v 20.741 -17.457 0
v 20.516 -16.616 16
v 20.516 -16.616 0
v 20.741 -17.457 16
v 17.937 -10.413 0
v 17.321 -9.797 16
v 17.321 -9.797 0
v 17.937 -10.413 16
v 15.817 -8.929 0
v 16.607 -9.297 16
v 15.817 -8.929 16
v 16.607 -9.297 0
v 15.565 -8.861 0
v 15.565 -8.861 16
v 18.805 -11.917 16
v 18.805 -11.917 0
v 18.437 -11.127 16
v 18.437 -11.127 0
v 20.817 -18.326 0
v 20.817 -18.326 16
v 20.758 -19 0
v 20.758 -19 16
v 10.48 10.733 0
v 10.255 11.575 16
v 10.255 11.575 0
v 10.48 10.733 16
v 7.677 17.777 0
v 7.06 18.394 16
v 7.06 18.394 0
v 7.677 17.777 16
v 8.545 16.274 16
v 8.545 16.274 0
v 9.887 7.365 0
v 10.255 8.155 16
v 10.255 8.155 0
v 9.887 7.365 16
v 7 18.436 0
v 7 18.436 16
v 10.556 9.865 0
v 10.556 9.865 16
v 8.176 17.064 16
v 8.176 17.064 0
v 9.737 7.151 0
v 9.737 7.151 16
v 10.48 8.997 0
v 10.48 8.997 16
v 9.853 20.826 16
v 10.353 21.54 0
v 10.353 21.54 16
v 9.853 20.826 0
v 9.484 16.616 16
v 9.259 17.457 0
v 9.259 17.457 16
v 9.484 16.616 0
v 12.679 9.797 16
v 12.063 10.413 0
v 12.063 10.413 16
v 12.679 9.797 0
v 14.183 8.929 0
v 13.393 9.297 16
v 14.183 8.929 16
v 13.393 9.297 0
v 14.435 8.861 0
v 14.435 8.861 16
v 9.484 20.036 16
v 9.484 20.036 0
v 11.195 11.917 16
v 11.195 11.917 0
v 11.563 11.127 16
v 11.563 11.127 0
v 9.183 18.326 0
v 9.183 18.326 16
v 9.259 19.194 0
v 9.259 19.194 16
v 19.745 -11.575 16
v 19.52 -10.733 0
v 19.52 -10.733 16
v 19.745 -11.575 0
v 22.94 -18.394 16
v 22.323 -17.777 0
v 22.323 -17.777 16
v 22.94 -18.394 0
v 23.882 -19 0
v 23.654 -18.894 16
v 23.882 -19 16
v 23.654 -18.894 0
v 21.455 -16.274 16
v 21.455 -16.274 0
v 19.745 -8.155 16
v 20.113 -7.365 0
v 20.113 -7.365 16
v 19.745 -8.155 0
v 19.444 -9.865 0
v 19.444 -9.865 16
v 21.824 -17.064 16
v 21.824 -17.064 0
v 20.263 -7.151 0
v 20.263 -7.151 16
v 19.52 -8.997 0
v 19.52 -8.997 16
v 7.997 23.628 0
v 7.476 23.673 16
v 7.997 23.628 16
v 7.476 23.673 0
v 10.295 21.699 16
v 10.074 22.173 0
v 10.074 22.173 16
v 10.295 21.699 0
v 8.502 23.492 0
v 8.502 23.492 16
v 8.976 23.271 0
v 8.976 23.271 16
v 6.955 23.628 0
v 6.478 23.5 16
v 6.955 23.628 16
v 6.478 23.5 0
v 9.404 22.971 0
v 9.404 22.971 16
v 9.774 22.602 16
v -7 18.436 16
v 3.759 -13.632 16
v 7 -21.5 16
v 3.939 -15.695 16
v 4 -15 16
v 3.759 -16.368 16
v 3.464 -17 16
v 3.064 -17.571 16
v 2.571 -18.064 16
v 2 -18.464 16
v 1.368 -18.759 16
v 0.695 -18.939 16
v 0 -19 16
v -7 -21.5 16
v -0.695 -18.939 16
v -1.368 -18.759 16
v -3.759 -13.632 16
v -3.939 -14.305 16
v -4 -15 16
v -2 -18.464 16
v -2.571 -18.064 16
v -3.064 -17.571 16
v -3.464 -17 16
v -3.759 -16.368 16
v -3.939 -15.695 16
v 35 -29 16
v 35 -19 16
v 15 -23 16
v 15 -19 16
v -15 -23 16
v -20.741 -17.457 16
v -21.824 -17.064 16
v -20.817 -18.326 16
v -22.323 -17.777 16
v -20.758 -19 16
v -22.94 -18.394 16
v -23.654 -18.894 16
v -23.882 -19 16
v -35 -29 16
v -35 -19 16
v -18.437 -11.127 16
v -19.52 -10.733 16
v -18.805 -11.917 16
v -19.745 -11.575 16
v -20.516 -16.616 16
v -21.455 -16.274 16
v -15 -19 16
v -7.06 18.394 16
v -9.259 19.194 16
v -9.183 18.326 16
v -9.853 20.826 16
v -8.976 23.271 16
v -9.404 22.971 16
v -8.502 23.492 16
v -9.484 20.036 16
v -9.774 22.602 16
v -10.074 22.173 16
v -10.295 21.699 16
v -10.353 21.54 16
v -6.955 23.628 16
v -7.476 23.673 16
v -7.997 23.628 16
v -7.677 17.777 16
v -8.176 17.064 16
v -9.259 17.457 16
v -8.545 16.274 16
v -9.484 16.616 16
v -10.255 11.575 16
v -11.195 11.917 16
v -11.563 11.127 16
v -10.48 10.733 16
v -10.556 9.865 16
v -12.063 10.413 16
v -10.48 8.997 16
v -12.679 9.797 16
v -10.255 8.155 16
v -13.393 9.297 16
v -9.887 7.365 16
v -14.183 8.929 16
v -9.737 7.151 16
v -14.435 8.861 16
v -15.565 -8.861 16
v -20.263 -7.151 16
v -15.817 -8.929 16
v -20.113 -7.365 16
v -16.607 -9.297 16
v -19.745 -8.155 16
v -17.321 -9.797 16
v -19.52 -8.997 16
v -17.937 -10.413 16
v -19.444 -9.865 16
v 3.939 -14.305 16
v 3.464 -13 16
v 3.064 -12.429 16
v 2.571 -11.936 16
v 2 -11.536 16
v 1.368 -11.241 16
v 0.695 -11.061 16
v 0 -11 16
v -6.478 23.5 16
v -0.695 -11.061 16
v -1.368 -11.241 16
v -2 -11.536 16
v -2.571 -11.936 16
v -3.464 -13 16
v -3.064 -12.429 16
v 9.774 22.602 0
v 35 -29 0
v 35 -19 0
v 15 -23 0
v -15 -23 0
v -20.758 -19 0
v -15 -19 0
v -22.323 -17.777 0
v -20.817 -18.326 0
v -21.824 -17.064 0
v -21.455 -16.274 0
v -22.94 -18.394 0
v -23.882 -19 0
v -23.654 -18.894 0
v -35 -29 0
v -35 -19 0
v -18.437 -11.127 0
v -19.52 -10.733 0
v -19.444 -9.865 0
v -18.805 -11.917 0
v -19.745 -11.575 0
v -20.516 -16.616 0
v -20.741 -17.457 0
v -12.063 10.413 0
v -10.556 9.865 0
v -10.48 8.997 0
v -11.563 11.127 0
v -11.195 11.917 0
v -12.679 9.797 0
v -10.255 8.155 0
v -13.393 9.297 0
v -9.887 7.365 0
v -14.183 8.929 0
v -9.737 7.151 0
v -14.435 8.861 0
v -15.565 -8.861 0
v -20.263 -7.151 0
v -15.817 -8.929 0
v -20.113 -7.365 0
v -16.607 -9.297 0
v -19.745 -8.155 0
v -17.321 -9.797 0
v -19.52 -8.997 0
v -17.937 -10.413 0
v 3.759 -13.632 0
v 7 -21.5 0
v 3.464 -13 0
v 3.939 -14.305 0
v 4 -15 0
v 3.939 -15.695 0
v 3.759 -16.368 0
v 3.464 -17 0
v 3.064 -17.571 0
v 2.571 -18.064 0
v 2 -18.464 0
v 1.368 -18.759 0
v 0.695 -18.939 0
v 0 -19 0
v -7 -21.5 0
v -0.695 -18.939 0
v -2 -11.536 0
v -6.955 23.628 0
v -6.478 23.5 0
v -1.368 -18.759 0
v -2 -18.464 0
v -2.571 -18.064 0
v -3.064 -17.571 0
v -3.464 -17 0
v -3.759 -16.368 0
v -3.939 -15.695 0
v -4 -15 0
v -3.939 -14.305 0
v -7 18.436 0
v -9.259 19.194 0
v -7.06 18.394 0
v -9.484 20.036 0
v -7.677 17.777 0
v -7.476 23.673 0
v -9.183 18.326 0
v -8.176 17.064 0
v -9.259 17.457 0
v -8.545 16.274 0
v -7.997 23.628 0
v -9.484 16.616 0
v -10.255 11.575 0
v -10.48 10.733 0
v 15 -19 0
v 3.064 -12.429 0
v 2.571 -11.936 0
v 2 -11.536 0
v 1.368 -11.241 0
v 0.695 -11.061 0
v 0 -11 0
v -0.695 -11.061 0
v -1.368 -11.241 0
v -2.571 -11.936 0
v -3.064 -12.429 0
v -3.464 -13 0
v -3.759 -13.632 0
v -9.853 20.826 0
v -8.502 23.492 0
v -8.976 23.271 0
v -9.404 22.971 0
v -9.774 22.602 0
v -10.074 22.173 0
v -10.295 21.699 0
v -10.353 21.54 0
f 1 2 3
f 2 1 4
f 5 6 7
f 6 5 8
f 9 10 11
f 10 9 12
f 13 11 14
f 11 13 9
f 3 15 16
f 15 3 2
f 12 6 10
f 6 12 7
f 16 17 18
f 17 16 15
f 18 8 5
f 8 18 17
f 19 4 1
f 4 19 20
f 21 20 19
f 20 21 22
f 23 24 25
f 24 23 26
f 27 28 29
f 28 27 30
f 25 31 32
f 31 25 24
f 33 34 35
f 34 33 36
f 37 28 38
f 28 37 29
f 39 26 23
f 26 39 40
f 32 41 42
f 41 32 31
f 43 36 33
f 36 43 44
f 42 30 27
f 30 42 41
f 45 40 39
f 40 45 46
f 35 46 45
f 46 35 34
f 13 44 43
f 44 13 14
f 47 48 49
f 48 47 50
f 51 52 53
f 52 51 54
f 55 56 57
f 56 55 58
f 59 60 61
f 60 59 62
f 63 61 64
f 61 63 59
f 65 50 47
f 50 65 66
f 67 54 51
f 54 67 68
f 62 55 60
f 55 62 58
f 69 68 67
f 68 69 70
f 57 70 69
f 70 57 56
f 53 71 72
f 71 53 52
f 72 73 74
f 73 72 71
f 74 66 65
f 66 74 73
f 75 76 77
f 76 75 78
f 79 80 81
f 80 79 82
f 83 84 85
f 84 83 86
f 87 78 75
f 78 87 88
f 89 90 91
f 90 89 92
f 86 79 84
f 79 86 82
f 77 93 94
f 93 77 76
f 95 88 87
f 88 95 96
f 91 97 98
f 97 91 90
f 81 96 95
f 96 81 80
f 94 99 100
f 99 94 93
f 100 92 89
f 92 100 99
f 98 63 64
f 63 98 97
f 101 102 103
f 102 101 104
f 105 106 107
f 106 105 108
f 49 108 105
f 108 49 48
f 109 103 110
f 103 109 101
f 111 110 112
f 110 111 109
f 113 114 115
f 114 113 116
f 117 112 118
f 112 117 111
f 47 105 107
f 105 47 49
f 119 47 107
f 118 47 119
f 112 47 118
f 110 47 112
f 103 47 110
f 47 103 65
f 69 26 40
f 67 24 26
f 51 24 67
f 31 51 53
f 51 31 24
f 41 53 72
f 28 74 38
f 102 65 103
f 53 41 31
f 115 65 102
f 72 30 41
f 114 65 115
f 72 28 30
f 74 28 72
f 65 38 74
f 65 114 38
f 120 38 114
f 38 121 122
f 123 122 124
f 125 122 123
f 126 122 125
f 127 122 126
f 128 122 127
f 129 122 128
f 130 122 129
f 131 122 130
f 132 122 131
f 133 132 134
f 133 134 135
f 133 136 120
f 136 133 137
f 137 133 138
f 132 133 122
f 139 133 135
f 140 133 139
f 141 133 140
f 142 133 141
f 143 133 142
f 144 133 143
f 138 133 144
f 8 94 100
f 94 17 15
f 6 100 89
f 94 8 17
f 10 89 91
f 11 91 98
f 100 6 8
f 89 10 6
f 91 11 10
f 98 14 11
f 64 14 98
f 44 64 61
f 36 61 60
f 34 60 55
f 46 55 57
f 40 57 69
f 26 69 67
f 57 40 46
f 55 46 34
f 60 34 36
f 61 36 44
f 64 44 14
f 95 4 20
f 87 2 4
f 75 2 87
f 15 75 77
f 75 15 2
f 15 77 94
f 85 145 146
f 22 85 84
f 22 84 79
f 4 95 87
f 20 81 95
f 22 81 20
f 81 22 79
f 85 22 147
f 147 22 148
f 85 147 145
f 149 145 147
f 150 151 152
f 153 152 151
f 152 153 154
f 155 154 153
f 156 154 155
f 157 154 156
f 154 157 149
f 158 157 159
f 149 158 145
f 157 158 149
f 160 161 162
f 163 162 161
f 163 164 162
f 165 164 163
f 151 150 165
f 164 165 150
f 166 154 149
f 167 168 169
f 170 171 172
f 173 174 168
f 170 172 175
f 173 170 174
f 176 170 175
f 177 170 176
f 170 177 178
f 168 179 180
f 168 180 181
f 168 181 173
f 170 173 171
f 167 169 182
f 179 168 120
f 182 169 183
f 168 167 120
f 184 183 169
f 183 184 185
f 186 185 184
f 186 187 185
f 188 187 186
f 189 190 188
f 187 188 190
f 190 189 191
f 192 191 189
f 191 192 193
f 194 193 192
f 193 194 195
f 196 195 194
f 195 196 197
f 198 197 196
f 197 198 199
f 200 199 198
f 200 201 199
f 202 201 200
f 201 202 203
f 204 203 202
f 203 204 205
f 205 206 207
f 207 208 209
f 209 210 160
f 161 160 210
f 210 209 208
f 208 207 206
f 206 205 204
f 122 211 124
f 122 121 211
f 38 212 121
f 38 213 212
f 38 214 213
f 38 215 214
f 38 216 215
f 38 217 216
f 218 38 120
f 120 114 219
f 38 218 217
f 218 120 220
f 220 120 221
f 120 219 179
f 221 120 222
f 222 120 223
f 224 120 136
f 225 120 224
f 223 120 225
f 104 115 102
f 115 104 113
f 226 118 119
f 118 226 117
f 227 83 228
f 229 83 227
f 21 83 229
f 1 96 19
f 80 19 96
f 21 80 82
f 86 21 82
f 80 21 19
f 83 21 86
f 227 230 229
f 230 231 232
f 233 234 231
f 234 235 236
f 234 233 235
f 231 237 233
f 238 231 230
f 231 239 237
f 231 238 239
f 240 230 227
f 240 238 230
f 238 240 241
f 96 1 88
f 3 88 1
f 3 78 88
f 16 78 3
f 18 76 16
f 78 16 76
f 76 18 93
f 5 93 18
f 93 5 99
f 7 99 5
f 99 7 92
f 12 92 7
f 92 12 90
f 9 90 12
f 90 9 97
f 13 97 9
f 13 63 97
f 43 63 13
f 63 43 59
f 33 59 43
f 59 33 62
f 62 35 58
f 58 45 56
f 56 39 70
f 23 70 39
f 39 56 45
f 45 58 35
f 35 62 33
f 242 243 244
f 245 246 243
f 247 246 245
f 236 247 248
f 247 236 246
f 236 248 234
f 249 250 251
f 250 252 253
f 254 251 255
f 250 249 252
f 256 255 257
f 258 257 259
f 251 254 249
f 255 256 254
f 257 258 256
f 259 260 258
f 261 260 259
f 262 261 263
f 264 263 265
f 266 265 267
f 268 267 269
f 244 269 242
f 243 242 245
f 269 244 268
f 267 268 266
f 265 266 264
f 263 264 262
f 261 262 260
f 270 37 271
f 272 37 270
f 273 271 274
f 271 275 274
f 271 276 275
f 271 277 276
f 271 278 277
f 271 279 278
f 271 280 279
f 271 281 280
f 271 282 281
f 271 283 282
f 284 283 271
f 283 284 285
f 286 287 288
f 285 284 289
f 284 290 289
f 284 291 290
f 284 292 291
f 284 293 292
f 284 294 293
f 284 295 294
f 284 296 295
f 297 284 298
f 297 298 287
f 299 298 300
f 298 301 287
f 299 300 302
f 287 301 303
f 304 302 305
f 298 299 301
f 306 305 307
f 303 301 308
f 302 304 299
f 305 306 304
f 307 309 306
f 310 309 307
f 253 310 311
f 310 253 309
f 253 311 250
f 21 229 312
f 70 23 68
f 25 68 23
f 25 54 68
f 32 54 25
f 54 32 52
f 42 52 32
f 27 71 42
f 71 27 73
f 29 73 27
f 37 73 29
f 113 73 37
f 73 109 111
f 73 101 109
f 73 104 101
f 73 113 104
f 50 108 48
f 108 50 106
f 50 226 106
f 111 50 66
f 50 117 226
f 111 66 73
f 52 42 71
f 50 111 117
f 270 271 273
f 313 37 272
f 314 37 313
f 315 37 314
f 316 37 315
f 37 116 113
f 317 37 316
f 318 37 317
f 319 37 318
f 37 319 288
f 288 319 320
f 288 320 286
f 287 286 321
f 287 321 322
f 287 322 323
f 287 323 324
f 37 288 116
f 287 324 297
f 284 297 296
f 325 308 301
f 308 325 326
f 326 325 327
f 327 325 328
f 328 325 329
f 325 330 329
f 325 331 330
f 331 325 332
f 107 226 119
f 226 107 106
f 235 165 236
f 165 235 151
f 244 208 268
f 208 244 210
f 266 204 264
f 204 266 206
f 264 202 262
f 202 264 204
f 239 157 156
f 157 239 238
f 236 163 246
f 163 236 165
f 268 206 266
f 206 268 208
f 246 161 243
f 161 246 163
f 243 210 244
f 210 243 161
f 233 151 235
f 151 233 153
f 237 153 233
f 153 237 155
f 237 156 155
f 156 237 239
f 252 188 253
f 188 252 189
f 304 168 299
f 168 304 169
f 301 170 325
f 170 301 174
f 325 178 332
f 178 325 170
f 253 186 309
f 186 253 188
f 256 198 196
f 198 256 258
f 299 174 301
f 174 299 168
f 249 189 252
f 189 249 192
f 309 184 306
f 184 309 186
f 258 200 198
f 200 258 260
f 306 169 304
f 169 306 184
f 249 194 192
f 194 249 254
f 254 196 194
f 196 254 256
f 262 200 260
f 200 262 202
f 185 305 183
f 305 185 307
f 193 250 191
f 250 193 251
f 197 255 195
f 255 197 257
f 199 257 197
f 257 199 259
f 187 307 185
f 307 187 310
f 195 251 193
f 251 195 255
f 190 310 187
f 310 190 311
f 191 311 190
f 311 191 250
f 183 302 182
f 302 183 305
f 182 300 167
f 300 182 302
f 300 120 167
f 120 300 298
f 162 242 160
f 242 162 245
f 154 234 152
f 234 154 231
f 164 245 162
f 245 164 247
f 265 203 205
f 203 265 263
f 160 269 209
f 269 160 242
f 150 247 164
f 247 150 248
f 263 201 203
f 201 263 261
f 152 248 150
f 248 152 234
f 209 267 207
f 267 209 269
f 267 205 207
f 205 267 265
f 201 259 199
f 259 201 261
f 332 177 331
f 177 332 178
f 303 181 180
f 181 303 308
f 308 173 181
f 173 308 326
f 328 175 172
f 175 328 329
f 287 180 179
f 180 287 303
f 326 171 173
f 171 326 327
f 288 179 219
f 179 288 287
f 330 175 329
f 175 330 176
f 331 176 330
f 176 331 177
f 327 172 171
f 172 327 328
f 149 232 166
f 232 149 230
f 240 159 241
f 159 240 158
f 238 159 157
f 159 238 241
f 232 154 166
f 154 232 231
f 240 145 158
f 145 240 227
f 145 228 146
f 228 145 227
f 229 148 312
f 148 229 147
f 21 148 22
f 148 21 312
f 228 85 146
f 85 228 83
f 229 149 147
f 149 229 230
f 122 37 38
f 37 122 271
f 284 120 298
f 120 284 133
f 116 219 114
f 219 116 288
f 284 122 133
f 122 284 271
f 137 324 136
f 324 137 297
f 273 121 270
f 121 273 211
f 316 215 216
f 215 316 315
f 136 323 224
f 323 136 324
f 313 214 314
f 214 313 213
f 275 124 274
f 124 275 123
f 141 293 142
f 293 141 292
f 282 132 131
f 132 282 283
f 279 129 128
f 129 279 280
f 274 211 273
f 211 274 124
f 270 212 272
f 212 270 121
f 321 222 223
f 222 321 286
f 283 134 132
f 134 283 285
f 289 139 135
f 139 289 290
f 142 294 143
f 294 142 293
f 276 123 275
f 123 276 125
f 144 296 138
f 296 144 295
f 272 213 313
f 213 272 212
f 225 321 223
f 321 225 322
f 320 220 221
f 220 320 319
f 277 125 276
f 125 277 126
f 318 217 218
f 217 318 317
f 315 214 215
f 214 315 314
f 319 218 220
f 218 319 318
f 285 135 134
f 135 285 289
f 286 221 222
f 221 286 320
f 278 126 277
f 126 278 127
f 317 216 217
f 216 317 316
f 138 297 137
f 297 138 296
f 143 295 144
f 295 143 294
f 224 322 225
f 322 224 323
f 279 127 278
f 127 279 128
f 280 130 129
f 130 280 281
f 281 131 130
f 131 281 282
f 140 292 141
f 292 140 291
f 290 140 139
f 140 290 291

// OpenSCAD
module M1()
hull(){
cylinder(r=5,h=20,$fn=36);
translate([0,5,0])cylinder(r=5,h=20,$fn=36);}

module M2(){
M1();translate([0,30,0])M1();translate([-5,5,0])cube([8,25,21]);
}
module M3(){
translate([-5.5,-17.50,-1])M2();
translate([5.5,17.5,-1])rotate(180)M2();}
module M4()
difference(){
hull(){
translate([0,-22,0])cylinder(r=3,h=16,$fn=36);
translate([0,22,0])cylinder(r=3,h=16,$fn=36);
}
M3();
}
difference(){
union(){
translate([15,0,0])rotate(20)M4();
translate([-15,0,0])rotate(-20)M4();
translate([-35,-29,0])cube([20,10,16]);
translate([15,-29,0])cube([20,10,16]);
translate([-35,-29,0])cube([70,6,16]);
translate([-7,-21.5,0])cube([14,45,16]);

}
translate([0,-15,-1])cylinder(r=4,h=20,$fn=36);
}
